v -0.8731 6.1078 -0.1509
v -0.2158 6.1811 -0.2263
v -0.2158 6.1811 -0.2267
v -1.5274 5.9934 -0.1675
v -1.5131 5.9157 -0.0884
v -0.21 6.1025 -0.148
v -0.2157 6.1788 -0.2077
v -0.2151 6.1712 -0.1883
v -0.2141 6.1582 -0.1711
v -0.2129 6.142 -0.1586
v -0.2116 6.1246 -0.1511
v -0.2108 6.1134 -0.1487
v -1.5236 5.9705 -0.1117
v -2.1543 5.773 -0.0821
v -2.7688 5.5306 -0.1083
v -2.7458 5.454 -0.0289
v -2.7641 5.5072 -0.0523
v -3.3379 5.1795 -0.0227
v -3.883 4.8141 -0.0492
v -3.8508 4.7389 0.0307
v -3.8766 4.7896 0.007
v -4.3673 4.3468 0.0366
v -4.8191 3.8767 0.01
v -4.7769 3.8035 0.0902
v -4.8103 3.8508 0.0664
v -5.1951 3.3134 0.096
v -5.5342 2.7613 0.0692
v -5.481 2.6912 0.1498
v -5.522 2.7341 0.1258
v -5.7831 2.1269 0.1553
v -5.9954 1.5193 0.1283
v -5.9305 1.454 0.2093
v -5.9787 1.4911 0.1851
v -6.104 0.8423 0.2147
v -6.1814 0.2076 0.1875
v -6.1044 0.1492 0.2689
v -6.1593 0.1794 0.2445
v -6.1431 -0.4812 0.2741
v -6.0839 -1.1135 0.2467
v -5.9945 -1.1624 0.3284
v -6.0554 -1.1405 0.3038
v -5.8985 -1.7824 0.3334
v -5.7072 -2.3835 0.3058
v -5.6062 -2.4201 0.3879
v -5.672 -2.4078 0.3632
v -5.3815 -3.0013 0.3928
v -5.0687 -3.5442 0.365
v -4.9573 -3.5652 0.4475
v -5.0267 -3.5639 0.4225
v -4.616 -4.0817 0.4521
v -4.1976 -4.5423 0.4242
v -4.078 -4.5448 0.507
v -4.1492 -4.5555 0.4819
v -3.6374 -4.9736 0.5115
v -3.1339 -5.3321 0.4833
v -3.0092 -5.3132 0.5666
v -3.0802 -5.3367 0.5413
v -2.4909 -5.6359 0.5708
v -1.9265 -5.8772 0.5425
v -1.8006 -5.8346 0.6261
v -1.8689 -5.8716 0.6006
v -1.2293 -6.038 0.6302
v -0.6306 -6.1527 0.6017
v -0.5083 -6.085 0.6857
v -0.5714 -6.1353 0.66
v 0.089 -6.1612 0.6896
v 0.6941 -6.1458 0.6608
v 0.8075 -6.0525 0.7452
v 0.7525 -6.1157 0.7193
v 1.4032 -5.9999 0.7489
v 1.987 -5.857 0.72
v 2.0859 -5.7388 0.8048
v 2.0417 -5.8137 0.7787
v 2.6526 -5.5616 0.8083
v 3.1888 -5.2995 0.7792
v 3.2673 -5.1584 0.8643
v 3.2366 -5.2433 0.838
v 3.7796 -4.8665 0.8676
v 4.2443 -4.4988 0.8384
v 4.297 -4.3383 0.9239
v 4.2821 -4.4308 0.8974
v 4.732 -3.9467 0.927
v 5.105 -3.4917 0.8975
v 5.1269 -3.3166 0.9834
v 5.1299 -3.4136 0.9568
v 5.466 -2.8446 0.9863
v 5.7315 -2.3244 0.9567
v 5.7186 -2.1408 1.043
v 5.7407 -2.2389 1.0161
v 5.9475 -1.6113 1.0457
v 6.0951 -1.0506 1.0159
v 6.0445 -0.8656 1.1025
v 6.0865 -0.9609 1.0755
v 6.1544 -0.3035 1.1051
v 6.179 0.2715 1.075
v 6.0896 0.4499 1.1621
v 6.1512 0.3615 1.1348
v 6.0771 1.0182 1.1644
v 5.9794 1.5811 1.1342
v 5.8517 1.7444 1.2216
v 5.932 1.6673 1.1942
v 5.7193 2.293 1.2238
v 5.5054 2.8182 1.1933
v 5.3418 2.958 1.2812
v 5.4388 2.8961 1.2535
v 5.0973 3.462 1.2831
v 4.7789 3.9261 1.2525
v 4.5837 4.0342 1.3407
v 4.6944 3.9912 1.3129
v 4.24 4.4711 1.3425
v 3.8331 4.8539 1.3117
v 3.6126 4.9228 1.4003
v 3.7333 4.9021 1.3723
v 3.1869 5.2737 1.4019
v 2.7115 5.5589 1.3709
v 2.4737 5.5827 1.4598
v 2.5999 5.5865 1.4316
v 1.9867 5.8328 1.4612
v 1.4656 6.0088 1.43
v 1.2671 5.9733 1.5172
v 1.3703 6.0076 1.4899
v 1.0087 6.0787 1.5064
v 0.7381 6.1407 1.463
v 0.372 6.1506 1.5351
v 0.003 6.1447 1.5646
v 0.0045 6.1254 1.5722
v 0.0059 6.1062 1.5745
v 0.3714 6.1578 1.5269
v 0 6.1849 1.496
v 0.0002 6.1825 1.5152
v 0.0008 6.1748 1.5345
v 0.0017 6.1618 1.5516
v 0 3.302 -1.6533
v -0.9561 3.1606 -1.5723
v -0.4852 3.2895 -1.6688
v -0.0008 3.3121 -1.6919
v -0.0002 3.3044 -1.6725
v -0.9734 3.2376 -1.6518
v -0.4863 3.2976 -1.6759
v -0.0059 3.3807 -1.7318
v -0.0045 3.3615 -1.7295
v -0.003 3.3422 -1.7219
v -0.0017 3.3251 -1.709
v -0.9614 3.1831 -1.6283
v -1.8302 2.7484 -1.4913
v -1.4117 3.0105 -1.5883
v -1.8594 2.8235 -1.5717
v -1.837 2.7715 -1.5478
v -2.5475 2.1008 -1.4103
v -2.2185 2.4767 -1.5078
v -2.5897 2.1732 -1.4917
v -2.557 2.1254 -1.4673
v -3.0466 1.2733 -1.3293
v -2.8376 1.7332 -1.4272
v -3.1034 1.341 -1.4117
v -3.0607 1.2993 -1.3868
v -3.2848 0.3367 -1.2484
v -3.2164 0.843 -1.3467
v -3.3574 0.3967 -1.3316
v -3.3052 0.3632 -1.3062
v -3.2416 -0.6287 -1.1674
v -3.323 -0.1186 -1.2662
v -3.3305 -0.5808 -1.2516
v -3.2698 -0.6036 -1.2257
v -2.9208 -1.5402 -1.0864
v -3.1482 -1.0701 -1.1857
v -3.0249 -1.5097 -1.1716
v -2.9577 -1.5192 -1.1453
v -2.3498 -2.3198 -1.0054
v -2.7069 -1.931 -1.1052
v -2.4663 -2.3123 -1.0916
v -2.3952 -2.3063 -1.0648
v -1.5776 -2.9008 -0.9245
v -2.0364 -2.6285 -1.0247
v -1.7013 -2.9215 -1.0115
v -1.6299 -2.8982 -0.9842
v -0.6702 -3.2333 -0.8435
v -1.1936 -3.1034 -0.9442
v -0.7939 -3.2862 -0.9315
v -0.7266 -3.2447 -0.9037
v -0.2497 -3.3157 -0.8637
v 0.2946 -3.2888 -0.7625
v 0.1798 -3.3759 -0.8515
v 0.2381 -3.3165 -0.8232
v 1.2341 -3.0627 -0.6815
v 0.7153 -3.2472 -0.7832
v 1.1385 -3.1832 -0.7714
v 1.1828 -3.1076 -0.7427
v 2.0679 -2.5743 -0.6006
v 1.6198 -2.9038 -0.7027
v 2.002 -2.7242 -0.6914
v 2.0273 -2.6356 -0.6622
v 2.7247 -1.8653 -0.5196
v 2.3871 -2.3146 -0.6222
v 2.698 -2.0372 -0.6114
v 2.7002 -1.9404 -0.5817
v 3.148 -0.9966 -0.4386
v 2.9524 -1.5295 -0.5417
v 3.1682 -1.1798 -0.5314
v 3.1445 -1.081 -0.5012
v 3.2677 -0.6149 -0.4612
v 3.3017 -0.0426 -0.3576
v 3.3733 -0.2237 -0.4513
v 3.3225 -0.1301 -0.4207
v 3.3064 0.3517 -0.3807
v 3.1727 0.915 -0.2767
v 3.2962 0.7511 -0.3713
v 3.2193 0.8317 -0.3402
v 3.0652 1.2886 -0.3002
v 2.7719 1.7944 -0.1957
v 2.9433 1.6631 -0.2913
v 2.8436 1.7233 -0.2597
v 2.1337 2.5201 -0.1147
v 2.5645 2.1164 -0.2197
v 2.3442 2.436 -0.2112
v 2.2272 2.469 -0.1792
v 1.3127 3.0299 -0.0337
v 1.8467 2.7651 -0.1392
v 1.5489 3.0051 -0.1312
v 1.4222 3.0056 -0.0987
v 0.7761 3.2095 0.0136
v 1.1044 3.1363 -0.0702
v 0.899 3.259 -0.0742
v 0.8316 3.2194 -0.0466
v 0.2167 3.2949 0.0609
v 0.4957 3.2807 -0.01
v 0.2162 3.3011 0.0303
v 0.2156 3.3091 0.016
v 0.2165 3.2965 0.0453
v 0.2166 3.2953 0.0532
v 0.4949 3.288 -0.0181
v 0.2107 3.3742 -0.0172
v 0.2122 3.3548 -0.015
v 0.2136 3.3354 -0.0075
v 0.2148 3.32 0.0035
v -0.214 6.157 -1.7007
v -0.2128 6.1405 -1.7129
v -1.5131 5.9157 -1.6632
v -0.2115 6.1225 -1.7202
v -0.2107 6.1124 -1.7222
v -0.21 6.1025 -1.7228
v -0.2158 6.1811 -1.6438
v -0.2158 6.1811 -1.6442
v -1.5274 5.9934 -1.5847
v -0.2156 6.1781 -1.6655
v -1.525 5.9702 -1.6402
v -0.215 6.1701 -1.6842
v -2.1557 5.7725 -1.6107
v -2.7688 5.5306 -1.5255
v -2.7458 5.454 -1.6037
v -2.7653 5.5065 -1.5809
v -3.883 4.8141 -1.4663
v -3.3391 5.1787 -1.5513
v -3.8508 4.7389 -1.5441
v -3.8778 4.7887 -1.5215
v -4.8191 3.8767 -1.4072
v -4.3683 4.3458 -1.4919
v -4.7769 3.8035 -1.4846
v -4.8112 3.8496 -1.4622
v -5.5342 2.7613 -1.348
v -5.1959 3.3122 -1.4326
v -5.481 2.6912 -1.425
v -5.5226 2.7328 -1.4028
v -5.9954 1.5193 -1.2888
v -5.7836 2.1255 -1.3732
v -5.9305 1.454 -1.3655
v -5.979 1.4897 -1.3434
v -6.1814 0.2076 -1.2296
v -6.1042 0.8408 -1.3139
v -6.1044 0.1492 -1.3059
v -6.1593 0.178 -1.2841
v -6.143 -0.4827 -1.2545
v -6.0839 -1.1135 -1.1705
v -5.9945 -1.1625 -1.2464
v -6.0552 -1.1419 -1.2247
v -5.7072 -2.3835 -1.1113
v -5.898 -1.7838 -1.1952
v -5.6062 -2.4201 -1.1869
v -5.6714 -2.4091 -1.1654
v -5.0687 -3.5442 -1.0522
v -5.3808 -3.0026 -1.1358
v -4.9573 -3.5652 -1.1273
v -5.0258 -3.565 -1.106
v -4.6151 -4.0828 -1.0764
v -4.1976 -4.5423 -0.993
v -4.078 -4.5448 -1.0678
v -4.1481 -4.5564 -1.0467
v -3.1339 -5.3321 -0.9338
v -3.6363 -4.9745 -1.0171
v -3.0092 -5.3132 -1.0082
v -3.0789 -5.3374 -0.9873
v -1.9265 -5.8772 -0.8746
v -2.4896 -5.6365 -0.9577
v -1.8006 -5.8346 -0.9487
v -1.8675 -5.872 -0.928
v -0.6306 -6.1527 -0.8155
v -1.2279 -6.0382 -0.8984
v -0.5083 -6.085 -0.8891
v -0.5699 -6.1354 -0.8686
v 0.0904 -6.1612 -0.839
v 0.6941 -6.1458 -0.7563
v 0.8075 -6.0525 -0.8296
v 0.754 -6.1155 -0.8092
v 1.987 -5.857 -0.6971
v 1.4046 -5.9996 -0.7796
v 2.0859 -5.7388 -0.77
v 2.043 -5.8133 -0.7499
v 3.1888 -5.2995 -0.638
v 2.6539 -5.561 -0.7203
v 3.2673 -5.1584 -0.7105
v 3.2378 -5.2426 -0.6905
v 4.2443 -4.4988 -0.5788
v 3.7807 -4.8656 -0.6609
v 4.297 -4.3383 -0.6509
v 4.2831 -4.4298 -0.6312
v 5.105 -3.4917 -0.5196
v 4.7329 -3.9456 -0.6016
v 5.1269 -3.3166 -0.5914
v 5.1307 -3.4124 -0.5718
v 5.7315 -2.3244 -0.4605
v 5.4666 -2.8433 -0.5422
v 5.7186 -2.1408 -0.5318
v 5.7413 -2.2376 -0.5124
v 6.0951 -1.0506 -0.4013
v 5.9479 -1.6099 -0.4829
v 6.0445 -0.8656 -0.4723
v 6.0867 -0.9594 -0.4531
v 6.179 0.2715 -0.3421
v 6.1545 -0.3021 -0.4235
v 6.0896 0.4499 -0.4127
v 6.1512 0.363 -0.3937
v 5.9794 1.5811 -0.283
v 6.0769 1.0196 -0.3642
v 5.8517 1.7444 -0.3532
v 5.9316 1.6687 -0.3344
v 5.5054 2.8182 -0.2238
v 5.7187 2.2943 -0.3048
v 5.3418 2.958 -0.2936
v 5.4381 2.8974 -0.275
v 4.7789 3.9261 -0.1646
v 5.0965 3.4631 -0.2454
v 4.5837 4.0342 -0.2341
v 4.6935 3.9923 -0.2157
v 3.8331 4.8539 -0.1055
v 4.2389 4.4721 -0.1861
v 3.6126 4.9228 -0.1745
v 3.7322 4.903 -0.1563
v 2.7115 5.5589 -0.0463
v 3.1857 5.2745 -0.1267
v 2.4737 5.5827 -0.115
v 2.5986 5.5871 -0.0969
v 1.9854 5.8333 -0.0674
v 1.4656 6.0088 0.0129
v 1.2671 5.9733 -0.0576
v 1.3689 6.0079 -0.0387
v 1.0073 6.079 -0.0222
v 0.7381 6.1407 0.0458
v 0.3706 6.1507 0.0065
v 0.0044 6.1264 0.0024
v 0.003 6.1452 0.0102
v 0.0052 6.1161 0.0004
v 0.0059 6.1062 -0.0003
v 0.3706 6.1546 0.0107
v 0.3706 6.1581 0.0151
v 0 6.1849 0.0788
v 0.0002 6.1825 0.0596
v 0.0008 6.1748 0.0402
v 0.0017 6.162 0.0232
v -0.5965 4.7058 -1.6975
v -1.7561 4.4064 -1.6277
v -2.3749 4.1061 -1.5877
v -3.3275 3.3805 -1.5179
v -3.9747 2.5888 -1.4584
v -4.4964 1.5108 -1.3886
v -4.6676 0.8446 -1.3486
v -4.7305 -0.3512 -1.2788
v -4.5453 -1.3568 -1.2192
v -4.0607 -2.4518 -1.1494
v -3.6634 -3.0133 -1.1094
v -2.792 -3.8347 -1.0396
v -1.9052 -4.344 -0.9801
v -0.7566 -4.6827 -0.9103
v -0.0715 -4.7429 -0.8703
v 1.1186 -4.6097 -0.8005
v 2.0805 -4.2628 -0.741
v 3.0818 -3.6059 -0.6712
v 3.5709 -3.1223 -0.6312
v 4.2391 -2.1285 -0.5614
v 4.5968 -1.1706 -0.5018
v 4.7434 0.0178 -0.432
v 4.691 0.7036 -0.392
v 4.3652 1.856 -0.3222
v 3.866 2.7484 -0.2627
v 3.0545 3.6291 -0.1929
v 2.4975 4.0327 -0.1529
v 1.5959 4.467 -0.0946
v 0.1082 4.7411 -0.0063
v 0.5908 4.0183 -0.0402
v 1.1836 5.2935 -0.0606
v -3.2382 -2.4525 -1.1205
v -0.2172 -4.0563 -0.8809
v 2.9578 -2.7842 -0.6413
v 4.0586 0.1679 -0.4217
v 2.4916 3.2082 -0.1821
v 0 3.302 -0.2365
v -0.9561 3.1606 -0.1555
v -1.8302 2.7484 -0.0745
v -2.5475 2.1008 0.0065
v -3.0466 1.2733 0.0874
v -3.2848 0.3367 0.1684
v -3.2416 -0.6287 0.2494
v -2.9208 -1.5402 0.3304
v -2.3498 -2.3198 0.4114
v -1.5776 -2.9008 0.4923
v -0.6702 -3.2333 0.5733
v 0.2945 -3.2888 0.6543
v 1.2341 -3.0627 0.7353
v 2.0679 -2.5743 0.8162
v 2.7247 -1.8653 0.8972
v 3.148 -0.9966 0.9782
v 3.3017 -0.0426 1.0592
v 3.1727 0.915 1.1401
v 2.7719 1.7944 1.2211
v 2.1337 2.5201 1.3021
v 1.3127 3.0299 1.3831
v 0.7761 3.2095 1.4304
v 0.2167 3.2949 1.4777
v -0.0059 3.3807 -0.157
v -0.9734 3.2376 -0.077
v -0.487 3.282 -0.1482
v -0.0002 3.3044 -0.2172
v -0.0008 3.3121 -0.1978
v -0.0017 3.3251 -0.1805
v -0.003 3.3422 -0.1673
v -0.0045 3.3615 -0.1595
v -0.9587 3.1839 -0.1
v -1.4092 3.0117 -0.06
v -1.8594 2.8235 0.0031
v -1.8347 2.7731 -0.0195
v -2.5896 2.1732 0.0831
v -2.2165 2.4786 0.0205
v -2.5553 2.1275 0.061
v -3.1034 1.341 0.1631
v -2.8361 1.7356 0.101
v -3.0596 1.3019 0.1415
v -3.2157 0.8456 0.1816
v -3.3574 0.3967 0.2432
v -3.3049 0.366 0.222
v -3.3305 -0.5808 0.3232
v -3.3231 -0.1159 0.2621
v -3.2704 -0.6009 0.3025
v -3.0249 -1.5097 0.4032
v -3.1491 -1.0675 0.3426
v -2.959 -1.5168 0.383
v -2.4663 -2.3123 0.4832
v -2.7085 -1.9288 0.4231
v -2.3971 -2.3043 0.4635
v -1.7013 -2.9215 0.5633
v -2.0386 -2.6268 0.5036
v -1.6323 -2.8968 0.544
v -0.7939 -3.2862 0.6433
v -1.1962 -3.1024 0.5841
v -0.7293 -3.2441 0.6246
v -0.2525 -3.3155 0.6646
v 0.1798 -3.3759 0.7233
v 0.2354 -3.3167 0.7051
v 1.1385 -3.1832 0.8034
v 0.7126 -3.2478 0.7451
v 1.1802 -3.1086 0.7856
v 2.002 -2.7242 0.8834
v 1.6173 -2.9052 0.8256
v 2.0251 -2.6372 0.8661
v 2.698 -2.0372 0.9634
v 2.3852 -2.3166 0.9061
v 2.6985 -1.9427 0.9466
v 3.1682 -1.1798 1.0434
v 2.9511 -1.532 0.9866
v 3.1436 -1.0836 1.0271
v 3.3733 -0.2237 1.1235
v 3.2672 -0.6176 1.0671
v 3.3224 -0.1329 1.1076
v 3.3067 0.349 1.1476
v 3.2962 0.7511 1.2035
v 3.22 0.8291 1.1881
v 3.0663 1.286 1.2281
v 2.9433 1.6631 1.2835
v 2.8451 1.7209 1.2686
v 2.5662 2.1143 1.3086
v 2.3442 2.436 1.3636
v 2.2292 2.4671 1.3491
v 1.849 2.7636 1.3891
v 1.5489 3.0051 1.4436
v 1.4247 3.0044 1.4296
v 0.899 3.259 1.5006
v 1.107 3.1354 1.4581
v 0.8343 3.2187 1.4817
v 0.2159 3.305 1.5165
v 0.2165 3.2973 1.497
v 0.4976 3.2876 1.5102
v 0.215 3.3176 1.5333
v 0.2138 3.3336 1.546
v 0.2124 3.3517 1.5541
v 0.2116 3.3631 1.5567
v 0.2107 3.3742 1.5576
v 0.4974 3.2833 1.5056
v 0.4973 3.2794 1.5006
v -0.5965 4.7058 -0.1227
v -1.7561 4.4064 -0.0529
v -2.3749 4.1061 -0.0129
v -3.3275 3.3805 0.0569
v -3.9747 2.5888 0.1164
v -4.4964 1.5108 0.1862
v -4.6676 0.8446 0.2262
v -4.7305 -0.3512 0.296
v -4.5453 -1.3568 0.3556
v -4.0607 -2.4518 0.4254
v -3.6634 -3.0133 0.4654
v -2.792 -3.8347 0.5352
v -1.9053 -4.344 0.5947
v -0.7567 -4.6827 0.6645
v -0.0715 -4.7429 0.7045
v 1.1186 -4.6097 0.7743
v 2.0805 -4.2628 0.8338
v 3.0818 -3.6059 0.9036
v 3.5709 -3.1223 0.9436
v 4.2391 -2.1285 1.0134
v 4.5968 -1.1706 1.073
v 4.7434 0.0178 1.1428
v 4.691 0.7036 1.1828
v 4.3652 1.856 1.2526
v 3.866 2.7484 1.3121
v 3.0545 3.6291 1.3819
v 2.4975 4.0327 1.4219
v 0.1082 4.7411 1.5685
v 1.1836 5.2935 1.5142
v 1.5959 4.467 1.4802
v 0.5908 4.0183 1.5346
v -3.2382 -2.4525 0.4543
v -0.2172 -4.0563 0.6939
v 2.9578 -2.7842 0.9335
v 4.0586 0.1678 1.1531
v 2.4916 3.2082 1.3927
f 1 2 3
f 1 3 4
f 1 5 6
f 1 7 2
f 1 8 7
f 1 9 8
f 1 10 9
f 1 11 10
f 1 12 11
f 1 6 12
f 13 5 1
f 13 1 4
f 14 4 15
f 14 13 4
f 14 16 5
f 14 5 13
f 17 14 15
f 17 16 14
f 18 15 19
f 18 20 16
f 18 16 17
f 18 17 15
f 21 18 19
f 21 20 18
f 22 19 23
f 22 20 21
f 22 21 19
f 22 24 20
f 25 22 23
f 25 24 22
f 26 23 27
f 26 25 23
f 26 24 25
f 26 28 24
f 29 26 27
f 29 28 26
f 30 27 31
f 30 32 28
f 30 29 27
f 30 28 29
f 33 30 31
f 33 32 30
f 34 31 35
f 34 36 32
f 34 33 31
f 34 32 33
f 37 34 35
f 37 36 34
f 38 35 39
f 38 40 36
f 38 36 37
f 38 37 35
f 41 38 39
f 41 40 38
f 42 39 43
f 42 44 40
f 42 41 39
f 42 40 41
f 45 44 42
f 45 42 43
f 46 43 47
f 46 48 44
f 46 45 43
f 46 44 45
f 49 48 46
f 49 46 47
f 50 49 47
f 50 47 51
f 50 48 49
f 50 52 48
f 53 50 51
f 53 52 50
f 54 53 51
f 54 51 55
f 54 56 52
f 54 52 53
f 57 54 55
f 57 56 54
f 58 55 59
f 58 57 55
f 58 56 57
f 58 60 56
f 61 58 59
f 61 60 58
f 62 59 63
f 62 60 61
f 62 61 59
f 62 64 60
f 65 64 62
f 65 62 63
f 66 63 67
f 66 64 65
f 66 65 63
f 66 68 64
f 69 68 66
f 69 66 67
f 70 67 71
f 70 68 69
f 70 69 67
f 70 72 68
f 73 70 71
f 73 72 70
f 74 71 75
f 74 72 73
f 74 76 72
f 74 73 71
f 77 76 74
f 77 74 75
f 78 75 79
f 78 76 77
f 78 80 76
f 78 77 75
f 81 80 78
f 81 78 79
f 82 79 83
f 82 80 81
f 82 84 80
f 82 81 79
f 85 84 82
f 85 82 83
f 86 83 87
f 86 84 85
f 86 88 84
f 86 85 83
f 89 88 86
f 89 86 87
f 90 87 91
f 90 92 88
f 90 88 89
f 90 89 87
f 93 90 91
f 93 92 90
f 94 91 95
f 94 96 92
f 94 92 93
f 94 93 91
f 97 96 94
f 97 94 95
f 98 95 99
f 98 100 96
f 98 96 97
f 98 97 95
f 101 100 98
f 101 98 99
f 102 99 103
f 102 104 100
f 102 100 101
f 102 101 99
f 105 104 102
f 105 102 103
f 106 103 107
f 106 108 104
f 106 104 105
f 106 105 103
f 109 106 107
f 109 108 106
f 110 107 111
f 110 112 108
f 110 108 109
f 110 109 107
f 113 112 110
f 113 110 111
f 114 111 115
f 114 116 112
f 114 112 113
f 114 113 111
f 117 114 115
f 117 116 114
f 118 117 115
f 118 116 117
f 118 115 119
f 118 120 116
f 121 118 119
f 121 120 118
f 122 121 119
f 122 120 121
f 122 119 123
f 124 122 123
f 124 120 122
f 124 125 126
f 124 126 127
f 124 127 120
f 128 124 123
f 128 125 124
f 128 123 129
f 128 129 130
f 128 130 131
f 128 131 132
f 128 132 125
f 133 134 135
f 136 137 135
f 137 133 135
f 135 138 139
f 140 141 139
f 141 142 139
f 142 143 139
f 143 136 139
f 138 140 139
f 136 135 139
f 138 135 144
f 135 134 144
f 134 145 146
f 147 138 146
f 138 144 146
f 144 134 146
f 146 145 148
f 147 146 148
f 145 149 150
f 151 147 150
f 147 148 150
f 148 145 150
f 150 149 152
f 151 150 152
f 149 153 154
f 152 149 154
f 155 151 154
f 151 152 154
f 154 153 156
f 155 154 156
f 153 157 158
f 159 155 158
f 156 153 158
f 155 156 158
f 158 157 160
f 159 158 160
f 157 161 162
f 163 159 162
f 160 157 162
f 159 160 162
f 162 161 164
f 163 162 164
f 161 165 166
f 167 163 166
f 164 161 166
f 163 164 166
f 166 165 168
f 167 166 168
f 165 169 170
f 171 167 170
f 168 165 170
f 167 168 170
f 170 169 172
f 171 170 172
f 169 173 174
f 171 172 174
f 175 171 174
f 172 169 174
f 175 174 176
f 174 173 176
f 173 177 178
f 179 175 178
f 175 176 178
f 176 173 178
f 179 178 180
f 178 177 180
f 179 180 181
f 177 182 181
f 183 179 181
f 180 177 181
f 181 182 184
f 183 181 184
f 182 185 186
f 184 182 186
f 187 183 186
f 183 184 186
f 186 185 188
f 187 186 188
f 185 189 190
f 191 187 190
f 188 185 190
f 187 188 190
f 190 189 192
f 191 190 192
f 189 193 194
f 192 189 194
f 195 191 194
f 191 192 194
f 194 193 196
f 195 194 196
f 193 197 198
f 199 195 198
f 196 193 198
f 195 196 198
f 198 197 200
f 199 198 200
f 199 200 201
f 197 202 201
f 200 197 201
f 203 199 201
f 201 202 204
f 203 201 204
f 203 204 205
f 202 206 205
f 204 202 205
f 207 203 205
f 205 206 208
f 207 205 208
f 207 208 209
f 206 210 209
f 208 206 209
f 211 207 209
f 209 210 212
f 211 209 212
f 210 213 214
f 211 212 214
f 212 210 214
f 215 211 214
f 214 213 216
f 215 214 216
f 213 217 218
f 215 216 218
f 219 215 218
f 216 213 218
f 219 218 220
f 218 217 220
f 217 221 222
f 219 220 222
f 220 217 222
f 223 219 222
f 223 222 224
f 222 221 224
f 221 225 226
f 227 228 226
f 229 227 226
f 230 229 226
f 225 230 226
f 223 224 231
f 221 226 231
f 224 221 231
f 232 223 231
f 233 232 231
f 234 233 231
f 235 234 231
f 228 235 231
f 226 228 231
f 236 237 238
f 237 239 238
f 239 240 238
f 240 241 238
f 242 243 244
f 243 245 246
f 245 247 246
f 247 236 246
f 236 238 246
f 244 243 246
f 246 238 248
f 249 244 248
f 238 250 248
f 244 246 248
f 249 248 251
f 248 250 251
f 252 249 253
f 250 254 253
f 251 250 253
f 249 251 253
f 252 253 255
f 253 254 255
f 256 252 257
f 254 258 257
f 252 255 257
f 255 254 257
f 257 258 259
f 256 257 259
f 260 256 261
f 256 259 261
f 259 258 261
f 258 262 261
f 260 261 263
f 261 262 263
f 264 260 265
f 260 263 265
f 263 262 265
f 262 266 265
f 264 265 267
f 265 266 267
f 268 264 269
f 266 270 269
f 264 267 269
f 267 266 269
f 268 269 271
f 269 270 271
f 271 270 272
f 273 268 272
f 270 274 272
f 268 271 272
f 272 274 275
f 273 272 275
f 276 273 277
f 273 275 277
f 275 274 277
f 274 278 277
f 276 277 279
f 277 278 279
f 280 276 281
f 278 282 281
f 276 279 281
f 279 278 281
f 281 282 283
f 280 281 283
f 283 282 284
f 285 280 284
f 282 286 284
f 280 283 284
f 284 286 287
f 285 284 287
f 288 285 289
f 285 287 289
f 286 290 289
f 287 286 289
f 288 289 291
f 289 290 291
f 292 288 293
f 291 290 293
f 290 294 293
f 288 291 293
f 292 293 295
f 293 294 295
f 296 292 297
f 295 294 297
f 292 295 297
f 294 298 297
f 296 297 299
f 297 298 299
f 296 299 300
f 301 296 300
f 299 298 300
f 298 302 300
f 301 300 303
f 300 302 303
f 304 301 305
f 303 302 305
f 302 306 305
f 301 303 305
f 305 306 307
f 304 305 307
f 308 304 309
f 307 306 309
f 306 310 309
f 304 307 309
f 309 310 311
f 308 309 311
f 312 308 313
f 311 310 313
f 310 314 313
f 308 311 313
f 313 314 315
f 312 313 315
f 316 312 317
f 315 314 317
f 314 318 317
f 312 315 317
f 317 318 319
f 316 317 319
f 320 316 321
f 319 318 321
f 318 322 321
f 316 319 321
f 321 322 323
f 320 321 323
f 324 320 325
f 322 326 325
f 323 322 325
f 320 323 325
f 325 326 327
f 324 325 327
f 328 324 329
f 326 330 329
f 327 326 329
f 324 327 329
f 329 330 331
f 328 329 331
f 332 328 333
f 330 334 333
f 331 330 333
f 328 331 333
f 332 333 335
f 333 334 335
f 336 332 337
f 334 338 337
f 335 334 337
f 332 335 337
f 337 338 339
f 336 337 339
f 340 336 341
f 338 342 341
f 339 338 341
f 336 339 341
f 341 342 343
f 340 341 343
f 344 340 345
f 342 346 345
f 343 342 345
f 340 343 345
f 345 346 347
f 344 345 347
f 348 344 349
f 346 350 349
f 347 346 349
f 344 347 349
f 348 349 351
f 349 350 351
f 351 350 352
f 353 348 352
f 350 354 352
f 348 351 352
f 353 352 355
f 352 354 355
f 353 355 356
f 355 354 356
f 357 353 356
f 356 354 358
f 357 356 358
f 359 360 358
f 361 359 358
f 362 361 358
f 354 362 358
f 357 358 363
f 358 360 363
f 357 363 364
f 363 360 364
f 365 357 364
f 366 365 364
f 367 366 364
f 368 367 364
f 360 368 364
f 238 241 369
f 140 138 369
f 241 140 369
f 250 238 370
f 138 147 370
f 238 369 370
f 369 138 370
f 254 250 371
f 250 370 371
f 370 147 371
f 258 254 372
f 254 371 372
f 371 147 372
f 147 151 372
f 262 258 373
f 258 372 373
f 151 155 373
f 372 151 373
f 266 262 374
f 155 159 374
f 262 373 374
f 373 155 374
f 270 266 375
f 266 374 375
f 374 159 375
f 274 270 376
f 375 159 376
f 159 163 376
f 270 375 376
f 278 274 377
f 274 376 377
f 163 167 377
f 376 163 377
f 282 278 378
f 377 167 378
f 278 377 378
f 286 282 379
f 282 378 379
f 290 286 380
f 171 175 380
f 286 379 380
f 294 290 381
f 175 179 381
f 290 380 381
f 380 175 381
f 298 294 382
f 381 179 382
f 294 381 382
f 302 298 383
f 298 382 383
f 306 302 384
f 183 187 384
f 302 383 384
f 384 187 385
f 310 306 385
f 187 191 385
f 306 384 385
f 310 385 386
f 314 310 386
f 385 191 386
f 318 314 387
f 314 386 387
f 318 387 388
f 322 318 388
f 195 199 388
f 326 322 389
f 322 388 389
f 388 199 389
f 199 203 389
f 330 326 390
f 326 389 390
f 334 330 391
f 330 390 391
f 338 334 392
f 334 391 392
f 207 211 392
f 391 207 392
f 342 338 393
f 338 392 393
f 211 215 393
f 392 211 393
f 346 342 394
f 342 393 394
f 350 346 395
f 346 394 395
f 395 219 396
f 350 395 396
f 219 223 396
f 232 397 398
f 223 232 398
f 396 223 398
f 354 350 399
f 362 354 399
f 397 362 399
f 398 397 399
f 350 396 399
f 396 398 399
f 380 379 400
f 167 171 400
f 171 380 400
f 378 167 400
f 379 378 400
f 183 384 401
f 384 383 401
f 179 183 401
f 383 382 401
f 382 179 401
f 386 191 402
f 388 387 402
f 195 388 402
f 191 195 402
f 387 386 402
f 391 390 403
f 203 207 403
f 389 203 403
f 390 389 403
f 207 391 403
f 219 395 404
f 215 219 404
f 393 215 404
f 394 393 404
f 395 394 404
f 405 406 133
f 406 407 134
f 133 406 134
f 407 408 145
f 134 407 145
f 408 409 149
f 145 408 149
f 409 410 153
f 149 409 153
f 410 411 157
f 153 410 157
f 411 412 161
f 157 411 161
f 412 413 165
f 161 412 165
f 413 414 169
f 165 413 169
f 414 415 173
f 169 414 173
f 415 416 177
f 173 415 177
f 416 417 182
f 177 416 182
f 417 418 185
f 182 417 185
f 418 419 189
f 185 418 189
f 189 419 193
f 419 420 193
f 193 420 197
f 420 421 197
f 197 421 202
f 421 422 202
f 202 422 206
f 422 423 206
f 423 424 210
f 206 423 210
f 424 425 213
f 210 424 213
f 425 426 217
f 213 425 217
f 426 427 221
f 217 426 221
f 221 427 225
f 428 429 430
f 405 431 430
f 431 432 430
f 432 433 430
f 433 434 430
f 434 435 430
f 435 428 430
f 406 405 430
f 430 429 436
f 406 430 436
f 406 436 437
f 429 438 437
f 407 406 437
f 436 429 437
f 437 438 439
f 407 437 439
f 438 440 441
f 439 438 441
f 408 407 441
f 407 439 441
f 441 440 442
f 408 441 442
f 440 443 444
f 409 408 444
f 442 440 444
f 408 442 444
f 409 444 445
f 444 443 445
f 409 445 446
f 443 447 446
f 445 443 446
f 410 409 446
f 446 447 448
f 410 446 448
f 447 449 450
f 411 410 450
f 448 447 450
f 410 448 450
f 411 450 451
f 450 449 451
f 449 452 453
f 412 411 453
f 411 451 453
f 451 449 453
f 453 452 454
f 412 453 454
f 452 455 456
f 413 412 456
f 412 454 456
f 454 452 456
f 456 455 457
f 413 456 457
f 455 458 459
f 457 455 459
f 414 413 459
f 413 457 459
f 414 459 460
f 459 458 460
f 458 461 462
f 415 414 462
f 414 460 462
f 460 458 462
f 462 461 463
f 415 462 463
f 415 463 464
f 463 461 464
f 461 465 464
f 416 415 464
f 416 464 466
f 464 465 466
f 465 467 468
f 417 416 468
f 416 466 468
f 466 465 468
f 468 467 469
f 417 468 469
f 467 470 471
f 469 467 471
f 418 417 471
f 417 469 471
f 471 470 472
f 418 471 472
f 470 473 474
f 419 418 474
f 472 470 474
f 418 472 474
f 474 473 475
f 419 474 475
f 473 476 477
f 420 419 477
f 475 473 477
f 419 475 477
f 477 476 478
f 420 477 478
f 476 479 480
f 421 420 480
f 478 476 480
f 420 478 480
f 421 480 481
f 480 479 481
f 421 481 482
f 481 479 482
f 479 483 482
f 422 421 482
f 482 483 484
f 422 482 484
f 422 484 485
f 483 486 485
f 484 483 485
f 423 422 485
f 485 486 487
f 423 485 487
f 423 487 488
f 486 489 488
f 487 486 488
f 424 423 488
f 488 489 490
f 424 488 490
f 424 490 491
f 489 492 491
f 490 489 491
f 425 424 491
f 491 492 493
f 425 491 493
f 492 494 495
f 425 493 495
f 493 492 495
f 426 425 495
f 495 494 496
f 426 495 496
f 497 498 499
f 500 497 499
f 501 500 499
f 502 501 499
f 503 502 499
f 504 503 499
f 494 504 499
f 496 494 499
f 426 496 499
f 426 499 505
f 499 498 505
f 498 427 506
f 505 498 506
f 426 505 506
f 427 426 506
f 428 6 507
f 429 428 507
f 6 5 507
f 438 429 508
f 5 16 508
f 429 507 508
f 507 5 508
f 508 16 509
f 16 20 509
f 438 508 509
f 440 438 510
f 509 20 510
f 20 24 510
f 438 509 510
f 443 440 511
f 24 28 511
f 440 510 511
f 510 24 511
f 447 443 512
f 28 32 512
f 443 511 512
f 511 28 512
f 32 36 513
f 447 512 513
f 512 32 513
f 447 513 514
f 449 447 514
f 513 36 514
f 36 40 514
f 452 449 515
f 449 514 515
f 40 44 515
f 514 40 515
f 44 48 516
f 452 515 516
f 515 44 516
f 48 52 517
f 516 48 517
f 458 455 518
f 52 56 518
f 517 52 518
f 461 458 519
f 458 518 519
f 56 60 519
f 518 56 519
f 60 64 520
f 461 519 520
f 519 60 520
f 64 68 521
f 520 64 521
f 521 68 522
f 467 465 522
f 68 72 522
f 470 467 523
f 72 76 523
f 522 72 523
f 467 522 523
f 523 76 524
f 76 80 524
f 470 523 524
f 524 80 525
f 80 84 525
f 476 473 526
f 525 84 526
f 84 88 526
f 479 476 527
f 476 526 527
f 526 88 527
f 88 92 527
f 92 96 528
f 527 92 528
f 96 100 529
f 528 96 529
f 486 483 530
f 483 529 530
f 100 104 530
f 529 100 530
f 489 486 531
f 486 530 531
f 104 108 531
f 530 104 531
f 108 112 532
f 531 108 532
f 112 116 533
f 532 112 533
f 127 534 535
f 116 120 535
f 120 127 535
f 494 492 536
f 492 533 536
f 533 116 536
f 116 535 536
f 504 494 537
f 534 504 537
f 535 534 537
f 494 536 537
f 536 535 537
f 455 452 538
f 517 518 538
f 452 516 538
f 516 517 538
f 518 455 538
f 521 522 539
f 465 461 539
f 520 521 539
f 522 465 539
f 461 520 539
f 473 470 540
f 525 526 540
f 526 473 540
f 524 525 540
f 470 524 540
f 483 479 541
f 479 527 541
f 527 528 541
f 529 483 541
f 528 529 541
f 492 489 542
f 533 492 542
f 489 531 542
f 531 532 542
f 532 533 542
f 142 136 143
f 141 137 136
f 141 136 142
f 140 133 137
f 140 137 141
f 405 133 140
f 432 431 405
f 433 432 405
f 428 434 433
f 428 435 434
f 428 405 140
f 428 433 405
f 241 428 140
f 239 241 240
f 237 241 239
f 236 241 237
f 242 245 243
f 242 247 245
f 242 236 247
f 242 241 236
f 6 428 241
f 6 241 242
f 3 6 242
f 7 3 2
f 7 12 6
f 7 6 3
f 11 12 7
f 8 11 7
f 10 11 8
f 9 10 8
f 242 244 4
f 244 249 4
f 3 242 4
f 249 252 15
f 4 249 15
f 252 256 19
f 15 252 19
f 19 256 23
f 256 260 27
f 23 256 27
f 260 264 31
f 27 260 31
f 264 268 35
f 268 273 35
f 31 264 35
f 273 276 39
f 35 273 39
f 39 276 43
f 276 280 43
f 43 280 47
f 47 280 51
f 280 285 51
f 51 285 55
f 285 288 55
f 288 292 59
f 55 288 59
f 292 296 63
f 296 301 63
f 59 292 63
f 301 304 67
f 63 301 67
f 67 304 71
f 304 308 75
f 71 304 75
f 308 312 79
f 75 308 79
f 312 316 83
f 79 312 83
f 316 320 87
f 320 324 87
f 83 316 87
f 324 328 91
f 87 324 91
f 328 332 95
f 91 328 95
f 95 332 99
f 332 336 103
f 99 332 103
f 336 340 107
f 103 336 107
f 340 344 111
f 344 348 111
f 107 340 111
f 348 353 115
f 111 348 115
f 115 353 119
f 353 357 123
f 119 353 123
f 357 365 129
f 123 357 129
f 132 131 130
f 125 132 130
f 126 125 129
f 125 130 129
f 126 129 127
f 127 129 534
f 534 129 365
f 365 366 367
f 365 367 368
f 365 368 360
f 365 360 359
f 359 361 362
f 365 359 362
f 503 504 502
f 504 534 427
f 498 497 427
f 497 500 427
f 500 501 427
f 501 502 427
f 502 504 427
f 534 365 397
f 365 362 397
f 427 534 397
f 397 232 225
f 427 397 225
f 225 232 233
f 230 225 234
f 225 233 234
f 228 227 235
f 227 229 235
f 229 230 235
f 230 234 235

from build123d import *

# Parameters (mm, degrees)
SWEEP1_PITCH            = 1.73228
SWEEP1_HEIGHT           = 1.73228
SWEEP1_RADIUS           = 6.1849
SWEEP1_START_ANGLE      = 90
SKETCH4_W               = 1.5748
SKETCH4_H               = 2.8829
FILLET1_R               = 0.07874
CUT_EXTRUDE1_DEPTH      = 2.5748001
CUT_EXTRUDE1_DEPTH_BACK = 2.7322801


with BuildPart() as part:
    # Sweep1: sweep along a helix
    with BuildLine() as sweep1_path:
        add(Helix(SWEEP1_PITCH, SWEEP1_HEIGHT, SWEEP1_RADIUS, center=(0, 0, -1.73228), direction=(0, 0, 1), mode=Mode.PRIVATE).rotate(Axis((0, 0, -1.73228), (0, 0, 1)), SWEEP1_START_ANGLE))
    # Sketch4 → Sweep1 (sweep)
    with BuildSketch(Plane(origin=(0, 0, 0), x_dir=(0, 0, -1), z_dir=(1, 0, 0))):
        with Locations((0.94488, 4.74345)):
            Rectangle(SKETCH4_W, SKETCH4_H)
    sweep(path=sweep1_path.line, is_frenet=True)

    # Fillet1
    fillet1_edges = [part.edges().sort_by_distance(p)[0] for p in [
        (0, -6.184893342, 0.70866),
        (0, -3.301996445, 0.70866),
        (0, -3.301996445, -0.86614),
        (0, -6.184893341, -0.86614),
    ]]
    fillet(fillet1_edges, radius=FILLET1_R)

    # Sketch5 → Cut-Extrude1 (cut, two sides)
    with BuildSketch(Plane.XY) as cut_extrude1_sk:
        with BuildLine():
            Line((0, 6.1849), (0.216665859, 3.294883899))
            Line((0.216665859, 3.294883899), (0.216665859, 0))
            Line((0.216665859, 0), (0, 0))
            Line((0, 0), (0, 3.302))
            Line((0, 3.302), (-0.215849897, 6.181132326))
            ThreePointArc((-0.215849897, 6.181132326), (-0.107941389, 6.18395801), (0, 6.1849))
        make_face()
    extrude(amount=CUT_EXTRUDE1_DEPTH, mode=Mode.SUBTRACT)
    extrude(cut_extrude1_sk.sketch, amount=-CUT_EXTRUDE1_DEPTH_BACK, mode=Mode.SUBTRACT)


solid = part.part
